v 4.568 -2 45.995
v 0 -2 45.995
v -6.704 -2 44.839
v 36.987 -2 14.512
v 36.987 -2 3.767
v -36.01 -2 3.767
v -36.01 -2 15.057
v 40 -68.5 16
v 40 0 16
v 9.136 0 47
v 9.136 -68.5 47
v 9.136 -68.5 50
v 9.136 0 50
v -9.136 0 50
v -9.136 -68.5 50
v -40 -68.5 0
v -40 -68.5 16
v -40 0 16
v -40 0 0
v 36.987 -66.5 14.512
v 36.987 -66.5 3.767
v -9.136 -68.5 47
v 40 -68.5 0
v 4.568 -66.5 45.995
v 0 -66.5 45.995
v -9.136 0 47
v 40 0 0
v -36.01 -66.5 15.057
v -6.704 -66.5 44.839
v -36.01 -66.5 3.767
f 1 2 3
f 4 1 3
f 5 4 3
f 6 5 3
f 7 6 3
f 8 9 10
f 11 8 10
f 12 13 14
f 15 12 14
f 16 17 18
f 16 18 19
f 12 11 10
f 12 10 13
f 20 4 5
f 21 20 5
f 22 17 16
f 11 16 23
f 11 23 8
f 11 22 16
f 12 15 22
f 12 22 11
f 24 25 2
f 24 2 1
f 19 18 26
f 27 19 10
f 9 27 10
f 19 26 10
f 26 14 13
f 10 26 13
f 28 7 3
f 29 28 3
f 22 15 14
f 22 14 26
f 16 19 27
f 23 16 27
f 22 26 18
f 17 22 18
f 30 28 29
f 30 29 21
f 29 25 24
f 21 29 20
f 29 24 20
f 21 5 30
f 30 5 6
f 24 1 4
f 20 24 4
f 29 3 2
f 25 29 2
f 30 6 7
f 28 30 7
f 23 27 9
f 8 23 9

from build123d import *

# Parameters (mm, degrees)
F1_DEPTH = 66.5
F3_DEPTH = 2
F5_DEPTH = 2


with BuildPart() as f1:
    # F0 (on Front) → F1 (new body)
    with BuildSketch(Plane.XZ):
        Polygon((9.1355, 50), (0, 50), (-9.1355, 50), (-9.1355, 47), (-40, 16), (-40, 0), (0, 0), (40, 0), (40, 16), (9.1355, 47), align=None)
        Polygon((-6.7035206594, 44.8390617967), (0, 45.9953211248), (4.56775, 45.9953211248), (36.9867831469, 14.5120471716), (36.9867831469, 3.7666528951), (-36.0103435814, 3.7666528951), (-36.0103435814, 15.0574101135), align=None, mode=Mode.SUBTRACT)
    extrude(amount=F1_DEPTH)

    # F2 (on face) → F3 (join)
    with BuildSketch(Plane.XZ.offset(66.5)):
        Polygon((9.1355, 50), (-9.1355, 50), (-9.1355, 47), (-40, 16), (-40, 0), (40, 0), (40, 16), (9.1355, 47), align=None)
    extrude(amount=F3_DEPTH)

    # F4 (on face) → F5 (join)
    with BuildSketch(Plane(origin=(0, 0, 0), x_dir=(-1, 0, 0), z_dir=(0, 1, 0))):
        Polygon((9.1355, 50), (-9.1355, 50), (-9.1355, 47), (-40, 16), (-40, 0), (40, 0), (40, 16), (9.1355, 47), align=None)
    extrude(amount=-F5_DEPTH)


solid = f1.part
